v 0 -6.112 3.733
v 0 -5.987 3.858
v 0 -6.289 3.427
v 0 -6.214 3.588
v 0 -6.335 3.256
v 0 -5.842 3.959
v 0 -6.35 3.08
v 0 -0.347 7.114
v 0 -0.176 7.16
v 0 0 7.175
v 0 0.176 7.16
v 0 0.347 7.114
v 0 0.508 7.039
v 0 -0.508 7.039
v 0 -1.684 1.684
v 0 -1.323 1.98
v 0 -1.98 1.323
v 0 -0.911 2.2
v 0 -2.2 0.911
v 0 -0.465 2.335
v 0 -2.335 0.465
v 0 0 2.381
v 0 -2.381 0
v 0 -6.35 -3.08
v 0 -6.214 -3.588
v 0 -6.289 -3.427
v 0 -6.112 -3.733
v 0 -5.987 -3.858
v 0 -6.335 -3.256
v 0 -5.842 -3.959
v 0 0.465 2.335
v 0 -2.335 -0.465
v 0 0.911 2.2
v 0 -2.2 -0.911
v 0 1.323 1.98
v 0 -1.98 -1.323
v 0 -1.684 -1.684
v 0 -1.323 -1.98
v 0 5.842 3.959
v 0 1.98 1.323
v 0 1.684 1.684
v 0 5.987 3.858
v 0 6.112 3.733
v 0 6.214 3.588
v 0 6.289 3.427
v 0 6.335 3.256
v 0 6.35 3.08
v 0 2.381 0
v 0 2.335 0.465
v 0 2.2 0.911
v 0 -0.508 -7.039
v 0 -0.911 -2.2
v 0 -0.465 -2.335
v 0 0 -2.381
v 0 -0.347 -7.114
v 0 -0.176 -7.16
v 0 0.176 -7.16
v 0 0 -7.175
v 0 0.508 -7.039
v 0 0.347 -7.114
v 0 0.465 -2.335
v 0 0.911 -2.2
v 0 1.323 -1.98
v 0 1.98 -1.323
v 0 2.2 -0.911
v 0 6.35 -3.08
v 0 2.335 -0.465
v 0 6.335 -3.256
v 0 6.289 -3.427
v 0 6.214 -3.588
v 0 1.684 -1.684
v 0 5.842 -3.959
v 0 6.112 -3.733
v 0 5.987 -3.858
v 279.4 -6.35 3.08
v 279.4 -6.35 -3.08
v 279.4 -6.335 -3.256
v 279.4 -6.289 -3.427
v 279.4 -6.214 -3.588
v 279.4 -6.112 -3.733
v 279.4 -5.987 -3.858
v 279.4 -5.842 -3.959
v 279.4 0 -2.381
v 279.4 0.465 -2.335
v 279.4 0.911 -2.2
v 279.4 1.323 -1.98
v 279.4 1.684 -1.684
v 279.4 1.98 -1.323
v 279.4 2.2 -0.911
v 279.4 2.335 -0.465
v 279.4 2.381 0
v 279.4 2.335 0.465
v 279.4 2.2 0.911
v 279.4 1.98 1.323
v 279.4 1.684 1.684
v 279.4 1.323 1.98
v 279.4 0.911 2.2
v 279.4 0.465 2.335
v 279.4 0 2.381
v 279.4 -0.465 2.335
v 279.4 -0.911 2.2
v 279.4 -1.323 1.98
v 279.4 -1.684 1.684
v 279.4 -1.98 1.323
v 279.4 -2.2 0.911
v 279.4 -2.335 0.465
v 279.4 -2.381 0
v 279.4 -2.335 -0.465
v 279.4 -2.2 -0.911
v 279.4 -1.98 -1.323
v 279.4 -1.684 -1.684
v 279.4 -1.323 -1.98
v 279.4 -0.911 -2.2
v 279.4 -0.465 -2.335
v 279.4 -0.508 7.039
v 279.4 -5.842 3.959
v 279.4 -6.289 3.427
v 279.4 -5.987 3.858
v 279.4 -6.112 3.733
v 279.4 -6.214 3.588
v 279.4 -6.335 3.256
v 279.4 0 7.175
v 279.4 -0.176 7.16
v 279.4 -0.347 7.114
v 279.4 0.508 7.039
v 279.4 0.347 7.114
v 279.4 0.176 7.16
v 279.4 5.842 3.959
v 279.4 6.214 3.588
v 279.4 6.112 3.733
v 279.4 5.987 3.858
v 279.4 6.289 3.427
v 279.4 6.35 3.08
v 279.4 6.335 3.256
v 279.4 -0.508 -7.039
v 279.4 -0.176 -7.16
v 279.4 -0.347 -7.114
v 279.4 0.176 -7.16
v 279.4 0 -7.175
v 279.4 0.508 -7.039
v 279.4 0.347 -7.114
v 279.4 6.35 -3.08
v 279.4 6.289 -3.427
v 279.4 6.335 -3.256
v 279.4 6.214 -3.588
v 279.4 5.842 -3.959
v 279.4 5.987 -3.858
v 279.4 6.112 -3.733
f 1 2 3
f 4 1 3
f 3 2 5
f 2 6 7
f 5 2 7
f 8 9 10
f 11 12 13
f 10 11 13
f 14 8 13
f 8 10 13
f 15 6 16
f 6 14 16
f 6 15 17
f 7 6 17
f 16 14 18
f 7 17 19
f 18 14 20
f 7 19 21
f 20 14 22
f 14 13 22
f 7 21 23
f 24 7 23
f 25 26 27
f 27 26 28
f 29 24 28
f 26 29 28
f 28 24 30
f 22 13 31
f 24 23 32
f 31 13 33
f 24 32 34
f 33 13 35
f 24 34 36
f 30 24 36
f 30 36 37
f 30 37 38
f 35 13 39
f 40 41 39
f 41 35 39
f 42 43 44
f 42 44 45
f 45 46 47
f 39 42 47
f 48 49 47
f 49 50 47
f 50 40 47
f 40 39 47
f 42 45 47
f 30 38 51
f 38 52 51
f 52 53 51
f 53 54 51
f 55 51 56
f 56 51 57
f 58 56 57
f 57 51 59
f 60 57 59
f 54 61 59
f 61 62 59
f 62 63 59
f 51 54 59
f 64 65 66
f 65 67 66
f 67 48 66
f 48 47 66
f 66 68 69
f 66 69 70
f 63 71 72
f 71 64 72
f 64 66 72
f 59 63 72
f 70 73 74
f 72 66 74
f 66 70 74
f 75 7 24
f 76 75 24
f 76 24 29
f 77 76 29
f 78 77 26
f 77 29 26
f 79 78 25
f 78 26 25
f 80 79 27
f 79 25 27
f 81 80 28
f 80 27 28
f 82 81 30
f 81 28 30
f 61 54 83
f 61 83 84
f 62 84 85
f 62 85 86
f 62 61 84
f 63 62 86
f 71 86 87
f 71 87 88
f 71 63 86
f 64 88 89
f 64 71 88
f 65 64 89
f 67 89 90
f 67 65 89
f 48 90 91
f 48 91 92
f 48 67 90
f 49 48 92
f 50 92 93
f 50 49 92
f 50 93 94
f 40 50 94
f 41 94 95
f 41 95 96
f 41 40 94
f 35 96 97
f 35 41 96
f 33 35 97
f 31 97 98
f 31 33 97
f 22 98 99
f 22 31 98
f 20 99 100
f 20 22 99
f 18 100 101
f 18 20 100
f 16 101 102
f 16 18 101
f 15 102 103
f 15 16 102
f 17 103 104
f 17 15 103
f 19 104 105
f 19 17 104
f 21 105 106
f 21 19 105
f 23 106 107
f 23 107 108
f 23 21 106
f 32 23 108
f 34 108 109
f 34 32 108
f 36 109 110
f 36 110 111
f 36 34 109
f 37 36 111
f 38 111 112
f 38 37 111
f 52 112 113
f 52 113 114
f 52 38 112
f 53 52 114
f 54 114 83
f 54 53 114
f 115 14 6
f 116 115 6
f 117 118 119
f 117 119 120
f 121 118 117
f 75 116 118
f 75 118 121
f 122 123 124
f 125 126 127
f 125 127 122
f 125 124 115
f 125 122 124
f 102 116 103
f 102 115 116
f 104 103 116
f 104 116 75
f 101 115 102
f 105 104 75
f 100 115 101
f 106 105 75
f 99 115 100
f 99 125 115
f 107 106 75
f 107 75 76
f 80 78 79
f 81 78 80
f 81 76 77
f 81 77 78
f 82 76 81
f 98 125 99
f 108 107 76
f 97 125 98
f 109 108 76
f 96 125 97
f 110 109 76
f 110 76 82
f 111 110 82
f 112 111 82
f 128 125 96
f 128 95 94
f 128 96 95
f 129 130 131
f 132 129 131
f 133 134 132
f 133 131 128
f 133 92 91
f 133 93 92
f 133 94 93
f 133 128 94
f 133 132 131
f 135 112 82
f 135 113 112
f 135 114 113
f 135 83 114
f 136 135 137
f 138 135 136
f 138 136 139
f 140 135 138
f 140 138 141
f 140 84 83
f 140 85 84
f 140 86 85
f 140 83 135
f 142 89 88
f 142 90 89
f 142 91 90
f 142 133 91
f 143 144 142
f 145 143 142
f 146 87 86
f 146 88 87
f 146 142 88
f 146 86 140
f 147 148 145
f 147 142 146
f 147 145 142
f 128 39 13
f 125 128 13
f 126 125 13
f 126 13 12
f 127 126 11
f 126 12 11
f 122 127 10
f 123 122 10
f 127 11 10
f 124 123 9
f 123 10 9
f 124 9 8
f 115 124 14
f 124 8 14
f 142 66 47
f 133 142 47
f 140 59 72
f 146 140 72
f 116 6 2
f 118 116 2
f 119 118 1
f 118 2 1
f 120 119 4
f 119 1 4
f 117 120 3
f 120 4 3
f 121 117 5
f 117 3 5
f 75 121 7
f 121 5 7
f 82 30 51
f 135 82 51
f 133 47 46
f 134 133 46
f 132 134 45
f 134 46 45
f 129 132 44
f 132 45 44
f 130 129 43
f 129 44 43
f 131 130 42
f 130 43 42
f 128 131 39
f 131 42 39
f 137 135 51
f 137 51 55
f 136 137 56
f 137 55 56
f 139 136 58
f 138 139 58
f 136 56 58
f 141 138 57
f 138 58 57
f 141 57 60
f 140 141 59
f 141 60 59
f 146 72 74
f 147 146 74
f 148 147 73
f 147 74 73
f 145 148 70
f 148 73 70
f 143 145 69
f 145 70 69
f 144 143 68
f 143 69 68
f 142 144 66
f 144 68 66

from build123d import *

# Parameters (mm, degrees)
SKETCH1_R           = 2.38125
BOSS_EXTRUDE1_DEPTH = 279.4


with BuildPart() as part:
    # Sketch1 → Boss-Extrude1 (new body)
    with BuildSketch(Plane(origin=(0, 0, 0), x_dir=(0, 0, -1), z_dir=(1, 0, 0))):
        with BuildLine():
            Line((7.039054482, 0.508), (3.959468146, 5.842))
            ThreePointArc((3.959468146, 5.842), (3.587586336, 6.21388181), (3.079586336, 6.35))
            Line((3.079586336, 6.35), (-3.079586336, 6.35))
            ThreePointArc((-3.079586336, 6.35), (-3.587586336, 6.21388181), (-3.959468146, 5.842))
            Line((-3.959468146, 5.842), (-7.039054482, 0.508))
            ThreePointArc((-7.039054482, 0.508), (-7.175172672, 0), (-7.039054482, -0.508))
            Line((-7.039054482, -0.508), (-3.959468146, -5.842))
            ThreePointArc((-3.959468146, -5.842), (-3.587586336, -6.21388181), (-3.079586336, -6.35))
            Line((-3.079586336, -6.35), (3.079586336, -6.35))
            ThreePointArc((3.079586336, -6.35), (3.587586336, -6.21388181), (3.959468146, -5.842))
            Line((3.959468146, -5.842), (7.039054482, -0.508))
            ThreePointArc((7.039054482, -0.508), (7.175172672, 0), (7.039054482, 0.508))
        make_face()
        Circle(SKETCH1_R, mode=Mode.SUBTRACT)
    extrude(amount=BOSS_EXTRUDE1_DEPTH)


solid = part.part
